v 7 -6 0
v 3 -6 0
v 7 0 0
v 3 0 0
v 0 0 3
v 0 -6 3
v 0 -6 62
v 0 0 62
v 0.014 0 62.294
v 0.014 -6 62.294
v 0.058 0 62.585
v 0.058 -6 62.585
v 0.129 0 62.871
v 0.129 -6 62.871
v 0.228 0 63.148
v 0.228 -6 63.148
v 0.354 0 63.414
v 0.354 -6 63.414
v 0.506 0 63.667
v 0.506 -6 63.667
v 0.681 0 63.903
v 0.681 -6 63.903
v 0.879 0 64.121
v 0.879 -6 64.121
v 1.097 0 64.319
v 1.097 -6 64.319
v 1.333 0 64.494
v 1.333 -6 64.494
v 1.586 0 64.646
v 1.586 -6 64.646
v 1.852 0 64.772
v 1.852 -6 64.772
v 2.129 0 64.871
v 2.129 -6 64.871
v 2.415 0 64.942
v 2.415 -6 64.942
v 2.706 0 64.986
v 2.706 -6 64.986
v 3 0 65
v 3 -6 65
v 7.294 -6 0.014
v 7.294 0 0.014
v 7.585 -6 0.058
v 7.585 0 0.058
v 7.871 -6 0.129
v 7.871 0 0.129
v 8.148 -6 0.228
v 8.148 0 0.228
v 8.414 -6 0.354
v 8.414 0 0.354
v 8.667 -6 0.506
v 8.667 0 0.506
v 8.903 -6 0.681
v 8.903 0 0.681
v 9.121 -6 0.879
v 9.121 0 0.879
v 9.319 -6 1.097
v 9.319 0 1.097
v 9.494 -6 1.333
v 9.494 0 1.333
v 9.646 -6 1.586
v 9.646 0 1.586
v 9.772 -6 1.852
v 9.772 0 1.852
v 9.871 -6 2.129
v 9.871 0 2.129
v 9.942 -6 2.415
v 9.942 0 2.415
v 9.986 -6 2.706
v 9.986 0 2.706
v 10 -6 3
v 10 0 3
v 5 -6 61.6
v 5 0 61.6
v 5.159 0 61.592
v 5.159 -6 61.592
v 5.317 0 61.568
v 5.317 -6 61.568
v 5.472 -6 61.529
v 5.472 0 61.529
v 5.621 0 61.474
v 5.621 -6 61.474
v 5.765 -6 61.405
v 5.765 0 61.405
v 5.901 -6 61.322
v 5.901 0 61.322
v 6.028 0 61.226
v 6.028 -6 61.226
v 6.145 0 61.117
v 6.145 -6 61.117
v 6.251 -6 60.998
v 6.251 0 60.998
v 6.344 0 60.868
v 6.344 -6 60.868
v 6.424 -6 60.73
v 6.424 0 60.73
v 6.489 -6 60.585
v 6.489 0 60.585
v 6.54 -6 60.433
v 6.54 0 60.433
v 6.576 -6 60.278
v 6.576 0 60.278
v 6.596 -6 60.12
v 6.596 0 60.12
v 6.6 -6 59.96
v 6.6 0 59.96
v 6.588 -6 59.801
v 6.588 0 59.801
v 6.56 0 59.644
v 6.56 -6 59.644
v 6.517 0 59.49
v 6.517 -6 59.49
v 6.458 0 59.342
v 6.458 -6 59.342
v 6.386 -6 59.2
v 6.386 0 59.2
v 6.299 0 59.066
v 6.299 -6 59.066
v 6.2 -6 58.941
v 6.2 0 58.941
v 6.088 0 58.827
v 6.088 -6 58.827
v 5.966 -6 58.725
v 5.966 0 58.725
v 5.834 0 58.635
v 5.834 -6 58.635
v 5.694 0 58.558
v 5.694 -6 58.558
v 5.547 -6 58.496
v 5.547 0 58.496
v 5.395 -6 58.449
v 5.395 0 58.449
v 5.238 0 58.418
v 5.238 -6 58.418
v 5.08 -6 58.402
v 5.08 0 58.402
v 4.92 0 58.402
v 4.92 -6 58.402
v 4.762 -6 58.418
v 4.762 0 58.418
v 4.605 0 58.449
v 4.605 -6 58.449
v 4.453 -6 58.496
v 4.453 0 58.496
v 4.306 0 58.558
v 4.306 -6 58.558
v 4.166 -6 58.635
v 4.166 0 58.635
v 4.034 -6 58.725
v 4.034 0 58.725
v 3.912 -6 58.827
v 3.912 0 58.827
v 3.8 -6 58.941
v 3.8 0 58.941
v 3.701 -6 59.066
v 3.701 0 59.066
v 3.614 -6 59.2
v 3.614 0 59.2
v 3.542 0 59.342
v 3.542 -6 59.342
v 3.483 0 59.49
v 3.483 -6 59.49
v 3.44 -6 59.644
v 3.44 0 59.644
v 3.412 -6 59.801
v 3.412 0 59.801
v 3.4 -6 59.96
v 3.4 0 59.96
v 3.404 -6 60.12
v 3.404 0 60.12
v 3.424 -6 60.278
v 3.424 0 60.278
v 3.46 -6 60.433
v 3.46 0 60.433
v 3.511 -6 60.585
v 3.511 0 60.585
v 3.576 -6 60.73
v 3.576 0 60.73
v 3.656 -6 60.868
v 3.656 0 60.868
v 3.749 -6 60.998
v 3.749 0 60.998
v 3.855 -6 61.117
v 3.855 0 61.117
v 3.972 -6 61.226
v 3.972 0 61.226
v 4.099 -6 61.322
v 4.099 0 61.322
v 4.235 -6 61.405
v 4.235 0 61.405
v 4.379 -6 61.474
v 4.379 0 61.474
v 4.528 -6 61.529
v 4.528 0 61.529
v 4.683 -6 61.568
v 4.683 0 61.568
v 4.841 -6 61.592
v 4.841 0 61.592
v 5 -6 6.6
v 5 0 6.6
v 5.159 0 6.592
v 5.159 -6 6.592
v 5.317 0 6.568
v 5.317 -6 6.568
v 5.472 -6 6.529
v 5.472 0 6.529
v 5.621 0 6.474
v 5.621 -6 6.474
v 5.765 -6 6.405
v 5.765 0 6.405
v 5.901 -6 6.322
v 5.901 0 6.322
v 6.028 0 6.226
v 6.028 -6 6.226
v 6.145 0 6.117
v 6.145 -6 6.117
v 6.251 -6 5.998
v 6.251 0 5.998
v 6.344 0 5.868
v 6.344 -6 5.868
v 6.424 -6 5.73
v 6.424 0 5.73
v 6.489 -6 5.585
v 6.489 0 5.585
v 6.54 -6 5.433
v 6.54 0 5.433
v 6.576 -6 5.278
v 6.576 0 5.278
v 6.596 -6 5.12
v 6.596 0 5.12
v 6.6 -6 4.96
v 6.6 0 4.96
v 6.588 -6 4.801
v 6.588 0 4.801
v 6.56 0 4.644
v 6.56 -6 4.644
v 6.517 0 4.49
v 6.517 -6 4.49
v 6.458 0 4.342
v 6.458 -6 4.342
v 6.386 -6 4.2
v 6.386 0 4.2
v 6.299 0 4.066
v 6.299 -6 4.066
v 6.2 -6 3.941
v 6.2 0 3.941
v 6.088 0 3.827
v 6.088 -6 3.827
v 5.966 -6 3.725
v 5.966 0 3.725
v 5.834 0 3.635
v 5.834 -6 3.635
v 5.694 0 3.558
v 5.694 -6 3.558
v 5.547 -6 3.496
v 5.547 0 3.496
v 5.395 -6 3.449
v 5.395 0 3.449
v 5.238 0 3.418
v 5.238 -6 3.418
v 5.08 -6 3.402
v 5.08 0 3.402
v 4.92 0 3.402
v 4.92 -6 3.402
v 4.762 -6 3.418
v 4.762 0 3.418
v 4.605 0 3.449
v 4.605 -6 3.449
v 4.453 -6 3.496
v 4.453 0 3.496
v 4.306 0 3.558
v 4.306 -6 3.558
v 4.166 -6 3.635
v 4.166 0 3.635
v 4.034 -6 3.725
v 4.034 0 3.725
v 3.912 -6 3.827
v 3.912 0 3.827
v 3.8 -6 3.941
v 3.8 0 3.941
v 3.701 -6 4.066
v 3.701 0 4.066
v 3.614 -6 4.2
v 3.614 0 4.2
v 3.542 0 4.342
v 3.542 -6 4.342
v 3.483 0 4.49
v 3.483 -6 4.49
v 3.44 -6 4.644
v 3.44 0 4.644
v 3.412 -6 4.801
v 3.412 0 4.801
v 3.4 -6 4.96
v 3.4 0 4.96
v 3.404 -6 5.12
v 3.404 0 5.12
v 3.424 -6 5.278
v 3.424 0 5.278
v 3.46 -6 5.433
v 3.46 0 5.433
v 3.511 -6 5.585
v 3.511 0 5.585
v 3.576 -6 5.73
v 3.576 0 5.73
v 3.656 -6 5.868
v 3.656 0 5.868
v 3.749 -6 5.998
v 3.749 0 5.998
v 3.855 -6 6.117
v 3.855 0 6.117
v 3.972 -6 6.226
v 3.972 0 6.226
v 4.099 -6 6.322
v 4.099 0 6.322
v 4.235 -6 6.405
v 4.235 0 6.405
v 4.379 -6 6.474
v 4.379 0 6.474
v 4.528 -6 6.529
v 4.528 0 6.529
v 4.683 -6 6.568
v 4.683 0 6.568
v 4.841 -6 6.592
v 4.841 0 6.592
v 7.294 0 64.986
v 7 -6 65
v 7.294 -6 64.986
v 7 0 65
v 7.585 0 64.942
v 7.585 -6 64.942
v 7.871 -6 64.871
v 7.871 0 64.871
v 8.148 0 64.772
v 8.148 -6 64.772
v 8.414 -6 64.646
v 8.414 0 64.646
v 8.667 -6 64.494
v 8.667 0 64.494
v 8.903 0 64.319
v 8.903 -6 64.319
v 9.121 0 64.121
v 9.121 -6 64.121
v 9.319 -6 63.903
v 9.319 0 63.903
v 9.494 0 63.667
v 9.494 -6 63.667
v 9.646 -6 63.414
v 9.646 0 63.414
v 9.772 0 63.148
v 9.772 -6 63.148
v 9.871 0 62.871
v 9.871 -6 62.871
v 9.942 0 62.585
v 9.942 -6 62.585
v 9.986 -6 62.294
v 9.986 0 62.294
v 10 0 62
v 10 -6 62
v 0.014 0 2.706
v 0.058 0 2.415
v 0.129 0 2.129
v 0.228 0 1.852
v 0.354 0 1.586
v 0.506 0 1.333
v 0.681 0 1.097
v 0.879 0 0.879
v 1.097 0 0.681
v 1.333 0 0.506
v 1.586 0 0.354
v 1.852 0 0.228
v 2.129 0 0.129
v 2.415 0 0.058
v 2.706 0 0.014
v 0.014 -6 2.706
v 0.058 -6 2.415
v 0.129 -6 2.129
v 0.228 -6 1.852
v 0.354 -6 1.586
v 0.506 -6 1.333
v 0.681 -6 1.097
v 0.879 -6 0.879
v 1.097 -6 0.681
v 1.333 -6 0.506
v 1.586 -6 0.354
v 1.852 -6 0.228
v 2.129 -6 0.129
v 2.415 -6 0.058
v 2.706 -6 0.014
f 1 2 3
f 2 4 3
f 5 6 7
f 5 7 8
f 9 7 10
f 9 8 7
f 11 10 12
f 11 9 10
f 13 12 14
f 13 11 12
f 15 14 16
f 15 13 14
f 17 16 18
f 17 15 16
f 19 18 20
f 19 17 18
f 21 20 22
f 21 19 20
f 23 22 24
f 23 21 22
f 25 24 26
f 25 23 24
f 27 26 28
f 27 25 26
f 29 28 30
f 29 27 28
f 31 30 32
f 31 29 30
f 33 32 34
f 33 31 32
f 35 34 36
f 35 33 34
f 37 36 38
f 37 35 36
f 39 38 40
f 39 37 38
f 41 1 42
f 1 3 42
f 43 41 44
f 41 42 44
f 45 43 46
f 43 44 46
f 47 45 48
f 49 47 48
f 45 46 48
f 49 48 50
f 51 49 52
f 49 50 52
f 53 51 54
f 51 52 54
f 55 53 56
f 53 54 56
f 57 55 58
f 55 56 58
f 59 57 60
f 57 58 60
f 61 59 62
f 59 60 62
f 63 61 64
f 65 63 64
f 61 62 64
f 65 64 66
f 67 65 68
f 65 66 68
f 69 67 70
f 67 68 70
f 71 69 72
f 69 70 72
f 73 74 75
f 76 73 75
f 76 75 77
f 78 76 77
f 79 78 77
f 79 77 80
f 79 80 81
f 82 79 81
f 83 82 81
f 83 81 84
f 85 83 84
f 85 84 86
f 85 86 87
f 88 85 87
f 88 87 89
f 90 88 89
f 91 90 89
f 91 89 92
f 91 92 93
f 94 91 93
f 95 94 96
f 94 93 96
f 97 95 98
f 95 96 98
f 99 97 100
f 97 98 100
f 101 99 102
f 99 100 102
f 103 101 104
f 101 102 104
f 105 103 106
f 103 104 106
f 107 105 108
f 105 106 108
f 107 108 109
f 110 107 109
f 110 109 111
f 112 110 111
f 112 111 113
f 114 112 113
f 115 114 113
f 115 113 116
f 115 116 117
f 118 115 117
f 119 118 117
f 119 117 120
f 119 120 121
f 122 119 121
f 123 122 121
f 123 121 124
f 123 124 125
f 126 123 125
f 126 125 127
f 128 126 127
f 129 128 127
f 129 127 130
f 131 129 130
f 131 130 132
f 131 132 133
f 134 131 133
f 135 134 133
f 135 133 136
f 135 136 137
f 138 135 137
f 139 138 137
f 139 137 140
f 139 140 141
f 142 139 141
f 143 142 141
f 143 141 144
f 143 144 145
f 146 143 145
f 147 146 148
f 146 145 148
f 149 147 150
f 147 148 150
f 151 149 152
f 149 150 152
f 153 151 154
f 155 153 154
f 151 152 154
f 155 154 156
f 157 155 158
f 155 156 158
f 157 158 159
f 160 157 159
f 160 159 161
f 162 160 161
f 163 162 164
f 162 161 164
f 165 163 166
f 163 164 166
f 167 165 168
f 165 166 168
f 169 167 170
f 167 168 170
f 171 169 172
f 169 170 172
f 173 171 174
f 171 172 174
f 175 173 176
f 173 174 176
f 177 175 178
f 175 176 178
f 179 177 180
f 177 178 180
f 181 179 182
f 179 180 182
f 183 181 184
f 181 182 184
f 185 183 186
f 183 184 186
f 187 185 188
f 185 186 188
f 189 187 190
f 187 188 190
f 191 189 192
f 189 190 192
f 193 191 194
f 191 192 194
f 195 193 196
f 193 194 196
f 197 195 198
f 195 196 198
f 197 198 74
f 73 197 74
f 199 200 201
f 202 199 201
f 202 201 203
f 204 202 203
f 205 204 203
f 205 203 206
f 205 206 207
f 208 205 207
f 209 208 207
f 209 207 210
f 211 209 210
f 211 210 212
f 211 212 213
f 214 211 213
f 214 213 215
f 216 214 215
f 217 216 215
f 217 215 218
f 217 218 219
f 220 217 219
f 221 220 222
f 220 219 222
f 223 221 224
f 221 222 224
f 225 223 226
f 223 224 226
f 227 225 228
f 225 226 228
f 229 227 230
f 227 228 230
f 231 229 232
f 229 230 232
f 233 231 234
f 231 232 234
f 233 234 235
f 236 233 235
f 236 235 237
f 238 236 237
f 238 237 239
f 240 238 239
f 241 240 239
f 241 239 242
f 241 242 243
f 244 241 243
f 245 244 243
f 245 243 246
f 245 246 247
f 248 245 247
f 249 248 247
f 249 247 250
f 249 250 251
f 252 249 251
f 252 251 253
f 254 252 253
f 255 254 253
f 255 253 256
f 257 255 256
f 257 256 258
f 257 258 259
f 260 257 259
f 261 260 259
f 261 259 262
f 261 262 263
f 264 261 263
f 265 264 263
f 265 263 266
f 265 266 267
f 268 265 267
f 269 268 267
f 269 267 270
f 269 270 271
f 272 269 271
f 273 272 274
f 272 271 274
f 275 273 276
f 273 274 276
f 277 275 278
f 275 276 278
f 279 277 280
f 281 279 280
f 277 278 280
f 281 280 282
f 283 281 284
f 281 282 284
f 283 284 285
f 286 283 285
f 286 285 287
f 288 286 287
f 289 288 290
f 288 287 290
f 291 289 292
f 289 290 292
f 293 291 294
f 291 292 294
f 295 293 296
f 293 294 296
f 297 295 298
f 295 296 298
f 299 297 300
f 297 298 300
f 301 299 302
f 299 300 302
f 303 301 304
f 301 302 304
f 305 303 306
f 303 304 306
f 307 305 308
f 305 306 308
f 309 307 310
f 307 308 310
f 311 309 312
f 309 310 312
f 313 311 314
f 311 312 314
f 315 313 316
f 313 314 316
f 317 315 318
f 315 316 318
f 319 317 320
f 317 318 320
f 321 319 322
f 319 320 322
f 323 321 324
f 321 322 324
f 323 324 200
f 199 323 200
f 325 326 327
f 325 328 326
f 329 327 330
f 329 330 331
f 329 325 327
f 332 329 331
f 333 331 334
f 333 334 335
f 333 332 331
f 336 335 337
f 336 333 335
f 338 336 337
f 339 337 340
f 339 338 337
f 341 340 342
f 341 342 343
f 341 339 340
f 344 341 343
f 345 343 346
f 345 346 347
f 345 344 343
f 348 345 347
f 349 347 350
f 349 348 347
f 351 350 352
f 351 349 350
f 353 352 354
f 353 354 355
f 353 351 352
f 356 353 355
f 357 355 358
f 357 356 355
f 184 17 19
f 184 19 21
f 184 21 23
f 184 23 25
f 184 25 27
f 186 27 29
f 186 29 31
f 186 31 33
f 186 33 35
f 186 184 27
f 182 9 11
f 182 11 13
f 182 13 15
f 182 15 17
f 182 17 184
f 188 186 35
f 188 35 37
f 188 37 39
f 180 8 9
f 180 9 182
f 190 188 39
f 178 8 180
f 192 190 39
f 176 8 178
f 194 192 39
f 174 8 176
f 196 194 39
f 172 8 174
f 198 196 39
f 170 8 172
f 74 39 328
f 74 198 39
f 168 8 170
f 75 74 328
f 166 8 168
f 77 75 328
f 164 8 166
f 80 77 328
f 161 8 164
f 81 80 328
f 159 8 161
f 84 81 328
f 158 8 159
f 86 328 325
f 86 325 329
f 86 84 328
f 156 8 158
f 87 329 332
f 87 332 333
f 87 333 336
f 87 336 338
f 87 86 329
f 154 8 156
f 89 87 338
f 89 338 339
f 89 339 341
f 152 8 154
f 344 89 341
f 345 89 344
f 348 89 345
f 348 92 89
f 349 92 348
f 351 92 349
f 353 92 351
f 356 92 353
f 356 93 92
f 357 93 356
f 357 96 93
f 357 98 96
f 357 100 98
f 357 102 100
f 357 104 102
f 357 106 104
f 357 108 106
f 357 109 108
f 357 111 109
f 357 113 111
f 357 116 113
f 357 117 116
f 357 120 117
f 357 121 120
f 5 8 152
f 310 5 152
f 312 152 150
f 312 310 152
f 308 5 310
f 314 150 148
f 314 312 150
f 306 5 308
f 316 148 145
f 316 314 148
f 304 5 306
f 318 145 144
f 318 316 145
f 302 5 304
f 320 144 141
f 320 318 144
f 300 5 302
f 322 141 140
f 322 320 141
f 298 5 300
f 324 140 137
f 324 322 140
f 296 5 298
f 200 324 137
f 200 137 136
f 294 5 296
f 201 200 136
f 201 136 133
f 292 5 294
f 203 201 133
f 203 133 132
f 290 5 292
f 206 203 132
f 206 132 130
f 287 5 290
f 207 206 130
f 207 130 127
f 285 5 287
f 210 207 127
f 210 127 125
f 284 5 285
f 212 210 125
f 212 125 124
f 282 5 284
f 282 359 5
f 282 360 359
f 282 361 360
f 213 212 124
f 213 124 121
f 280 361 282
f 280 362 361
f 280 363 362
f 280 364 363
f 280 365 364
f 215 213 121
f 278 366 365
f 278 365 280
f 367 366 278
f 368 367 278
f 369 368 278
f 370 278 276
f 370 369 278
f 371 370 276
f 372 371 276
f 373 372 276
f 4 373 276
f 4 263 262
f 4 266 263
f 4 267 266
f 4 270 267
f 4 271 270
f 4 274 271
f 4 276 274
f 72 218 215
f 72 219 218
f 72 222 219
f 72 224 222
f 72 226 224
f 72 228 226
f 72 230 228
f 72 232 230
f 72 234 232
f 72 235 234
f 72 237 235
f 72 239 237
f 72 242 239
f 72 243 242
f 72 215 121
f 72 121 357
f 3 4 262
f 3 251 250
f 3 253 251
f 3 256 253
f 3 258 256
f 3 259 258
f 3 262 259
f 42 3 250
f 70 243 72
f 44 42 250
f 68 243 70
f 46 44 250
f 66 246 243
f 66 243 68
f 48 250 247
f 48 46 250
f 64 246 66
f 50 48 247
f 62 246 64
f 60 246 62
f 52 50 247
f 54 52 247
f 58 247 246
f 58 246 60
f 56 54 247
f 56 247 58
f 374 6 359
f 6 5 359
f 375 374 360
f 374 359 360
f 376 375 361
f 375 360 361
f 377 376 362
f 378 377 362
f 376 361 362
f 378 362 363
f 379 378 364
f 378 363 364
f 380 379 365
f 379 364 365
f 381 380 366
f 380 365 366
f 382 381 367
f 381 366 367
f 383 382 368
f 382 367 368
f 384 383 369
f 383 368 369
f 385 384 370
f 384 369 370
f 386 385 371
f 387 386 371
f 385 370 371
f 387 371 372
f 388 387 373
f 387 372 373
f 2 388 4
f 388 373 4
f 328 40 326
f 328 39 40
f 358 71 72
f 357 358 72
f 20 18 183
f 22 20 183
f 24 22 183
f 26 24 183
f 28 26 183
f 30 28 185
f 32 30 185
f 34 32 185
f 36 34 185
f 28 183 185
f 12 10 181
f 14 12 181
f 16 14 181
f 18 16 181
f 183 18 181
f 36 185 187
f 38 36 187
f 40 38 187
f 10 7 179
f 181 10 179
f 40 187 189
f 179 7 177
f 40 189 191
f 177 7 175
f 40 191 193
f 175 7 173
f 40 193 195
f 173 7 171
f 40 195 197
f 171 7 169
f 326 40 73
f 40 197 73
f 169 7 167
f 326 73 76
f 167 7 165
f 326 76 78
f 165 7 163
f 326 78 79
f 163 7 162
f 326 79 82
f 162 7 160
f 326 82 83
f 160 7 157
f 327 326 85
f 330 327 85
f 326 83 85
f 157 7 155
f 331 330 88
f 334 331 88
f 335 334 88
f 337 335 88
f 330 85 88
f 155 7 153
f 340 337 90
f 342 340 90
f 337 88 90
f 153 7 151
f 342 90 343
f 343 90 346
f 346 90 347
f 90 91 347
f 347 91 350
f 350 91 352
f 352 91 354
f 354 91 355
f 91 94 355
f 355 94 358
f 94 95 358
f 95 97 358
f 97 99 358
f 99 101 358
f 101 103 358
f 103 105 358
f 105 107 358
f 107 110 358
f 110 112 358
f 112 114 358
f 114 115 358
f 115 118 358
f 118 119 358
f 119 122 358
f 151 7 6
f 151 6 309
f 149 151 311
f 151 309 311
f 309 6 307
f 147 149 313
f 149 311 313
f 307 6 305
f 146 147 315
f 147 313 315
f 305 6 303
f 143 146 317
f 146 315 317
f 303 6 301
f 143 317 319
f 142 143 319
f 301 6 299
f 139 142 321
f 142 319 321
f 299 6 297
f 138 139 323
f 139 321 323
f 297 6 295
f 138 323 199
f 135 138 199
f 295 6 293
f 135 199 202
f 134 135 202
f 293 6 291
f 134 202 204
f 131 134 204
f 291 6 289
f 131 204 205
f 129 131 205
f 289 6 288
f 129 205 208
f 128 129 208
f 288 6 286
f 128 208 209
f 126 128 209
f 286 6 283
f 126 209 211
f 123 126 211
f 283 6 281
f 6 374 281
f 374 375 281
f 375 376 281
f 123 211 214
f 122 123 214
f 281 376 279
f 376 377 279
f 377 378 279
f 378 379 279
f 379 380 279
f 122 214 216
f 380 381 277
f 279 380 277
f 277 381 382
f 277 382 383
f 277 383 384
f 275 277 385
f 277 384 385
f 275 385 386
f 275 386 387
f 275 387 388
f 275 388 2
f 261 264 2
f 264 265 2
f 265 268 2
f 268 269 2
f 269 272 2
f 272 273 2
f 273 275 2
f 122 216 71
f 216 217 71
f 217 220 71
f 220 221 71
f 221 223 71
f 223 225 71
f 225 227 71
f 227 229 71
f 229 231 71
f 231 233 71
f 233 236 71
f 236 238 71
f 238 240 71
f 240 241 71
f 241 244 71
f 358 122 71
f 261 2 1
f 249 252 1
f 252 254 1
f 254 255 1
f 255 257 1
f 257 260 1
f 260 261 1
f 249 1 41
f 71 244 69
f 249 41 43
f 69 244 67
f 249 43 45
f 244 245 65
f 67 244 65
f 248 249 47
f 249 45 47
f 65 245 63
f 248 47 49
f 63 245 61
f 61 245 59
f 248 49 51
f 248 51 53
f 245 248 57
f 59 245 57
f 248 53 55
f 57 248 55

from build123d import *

# Parameters (mm, degrees)
SKETCH1_W           = 10
SKETCH1_H           = 6
BOSS_EXTRUDE1_DEPTH = 65
SKETCH2_R           = 1.6
CUT_EXTRUDE1_DEPTH  = 67.037867924
FILLET1_R           = 3


with BuildPart() as part:
    # Sketch1 → Boss-Extrude1 (new body)
    with BuildSketch(Plane.XY):
        with Locations((5, -3)):
            Rectangle(SKETCH1_W, SKETCH1_H)
    extrude(amount=BOSS_EXTRUDE1_DEPTH)

    # Sketch2 → Cut-Extrude1 (cut, through all)
    with BuildSketch(Plane(origin=(0, 0, 0), x_dir=(1, 0, 0), z_dir=(0, 1, 0))):
        with Locations(Location((5, -5, 0), (0, 0, 270))):
            Circle(SKETCH2_R)
        with Locations(Location((5, -60, 0), (0, 0, 270))):
            Circle(SKETCH2_R)
    extrude(amount=-CUT_EXTRUDE1_DEPTH, mode=Mode.SUBTRACT)

    # Fillet1
    fillet1_edges = [part.edges().sort_by_distance(p)[0] for p in [
        (10, -3, 65),
        (0, -3, 65),
        (10, -3, 0),
        (0, -3, 0),
    ]]
    fillet(fillet1_edges, radius=FILLET1_R)


solid = part.part
